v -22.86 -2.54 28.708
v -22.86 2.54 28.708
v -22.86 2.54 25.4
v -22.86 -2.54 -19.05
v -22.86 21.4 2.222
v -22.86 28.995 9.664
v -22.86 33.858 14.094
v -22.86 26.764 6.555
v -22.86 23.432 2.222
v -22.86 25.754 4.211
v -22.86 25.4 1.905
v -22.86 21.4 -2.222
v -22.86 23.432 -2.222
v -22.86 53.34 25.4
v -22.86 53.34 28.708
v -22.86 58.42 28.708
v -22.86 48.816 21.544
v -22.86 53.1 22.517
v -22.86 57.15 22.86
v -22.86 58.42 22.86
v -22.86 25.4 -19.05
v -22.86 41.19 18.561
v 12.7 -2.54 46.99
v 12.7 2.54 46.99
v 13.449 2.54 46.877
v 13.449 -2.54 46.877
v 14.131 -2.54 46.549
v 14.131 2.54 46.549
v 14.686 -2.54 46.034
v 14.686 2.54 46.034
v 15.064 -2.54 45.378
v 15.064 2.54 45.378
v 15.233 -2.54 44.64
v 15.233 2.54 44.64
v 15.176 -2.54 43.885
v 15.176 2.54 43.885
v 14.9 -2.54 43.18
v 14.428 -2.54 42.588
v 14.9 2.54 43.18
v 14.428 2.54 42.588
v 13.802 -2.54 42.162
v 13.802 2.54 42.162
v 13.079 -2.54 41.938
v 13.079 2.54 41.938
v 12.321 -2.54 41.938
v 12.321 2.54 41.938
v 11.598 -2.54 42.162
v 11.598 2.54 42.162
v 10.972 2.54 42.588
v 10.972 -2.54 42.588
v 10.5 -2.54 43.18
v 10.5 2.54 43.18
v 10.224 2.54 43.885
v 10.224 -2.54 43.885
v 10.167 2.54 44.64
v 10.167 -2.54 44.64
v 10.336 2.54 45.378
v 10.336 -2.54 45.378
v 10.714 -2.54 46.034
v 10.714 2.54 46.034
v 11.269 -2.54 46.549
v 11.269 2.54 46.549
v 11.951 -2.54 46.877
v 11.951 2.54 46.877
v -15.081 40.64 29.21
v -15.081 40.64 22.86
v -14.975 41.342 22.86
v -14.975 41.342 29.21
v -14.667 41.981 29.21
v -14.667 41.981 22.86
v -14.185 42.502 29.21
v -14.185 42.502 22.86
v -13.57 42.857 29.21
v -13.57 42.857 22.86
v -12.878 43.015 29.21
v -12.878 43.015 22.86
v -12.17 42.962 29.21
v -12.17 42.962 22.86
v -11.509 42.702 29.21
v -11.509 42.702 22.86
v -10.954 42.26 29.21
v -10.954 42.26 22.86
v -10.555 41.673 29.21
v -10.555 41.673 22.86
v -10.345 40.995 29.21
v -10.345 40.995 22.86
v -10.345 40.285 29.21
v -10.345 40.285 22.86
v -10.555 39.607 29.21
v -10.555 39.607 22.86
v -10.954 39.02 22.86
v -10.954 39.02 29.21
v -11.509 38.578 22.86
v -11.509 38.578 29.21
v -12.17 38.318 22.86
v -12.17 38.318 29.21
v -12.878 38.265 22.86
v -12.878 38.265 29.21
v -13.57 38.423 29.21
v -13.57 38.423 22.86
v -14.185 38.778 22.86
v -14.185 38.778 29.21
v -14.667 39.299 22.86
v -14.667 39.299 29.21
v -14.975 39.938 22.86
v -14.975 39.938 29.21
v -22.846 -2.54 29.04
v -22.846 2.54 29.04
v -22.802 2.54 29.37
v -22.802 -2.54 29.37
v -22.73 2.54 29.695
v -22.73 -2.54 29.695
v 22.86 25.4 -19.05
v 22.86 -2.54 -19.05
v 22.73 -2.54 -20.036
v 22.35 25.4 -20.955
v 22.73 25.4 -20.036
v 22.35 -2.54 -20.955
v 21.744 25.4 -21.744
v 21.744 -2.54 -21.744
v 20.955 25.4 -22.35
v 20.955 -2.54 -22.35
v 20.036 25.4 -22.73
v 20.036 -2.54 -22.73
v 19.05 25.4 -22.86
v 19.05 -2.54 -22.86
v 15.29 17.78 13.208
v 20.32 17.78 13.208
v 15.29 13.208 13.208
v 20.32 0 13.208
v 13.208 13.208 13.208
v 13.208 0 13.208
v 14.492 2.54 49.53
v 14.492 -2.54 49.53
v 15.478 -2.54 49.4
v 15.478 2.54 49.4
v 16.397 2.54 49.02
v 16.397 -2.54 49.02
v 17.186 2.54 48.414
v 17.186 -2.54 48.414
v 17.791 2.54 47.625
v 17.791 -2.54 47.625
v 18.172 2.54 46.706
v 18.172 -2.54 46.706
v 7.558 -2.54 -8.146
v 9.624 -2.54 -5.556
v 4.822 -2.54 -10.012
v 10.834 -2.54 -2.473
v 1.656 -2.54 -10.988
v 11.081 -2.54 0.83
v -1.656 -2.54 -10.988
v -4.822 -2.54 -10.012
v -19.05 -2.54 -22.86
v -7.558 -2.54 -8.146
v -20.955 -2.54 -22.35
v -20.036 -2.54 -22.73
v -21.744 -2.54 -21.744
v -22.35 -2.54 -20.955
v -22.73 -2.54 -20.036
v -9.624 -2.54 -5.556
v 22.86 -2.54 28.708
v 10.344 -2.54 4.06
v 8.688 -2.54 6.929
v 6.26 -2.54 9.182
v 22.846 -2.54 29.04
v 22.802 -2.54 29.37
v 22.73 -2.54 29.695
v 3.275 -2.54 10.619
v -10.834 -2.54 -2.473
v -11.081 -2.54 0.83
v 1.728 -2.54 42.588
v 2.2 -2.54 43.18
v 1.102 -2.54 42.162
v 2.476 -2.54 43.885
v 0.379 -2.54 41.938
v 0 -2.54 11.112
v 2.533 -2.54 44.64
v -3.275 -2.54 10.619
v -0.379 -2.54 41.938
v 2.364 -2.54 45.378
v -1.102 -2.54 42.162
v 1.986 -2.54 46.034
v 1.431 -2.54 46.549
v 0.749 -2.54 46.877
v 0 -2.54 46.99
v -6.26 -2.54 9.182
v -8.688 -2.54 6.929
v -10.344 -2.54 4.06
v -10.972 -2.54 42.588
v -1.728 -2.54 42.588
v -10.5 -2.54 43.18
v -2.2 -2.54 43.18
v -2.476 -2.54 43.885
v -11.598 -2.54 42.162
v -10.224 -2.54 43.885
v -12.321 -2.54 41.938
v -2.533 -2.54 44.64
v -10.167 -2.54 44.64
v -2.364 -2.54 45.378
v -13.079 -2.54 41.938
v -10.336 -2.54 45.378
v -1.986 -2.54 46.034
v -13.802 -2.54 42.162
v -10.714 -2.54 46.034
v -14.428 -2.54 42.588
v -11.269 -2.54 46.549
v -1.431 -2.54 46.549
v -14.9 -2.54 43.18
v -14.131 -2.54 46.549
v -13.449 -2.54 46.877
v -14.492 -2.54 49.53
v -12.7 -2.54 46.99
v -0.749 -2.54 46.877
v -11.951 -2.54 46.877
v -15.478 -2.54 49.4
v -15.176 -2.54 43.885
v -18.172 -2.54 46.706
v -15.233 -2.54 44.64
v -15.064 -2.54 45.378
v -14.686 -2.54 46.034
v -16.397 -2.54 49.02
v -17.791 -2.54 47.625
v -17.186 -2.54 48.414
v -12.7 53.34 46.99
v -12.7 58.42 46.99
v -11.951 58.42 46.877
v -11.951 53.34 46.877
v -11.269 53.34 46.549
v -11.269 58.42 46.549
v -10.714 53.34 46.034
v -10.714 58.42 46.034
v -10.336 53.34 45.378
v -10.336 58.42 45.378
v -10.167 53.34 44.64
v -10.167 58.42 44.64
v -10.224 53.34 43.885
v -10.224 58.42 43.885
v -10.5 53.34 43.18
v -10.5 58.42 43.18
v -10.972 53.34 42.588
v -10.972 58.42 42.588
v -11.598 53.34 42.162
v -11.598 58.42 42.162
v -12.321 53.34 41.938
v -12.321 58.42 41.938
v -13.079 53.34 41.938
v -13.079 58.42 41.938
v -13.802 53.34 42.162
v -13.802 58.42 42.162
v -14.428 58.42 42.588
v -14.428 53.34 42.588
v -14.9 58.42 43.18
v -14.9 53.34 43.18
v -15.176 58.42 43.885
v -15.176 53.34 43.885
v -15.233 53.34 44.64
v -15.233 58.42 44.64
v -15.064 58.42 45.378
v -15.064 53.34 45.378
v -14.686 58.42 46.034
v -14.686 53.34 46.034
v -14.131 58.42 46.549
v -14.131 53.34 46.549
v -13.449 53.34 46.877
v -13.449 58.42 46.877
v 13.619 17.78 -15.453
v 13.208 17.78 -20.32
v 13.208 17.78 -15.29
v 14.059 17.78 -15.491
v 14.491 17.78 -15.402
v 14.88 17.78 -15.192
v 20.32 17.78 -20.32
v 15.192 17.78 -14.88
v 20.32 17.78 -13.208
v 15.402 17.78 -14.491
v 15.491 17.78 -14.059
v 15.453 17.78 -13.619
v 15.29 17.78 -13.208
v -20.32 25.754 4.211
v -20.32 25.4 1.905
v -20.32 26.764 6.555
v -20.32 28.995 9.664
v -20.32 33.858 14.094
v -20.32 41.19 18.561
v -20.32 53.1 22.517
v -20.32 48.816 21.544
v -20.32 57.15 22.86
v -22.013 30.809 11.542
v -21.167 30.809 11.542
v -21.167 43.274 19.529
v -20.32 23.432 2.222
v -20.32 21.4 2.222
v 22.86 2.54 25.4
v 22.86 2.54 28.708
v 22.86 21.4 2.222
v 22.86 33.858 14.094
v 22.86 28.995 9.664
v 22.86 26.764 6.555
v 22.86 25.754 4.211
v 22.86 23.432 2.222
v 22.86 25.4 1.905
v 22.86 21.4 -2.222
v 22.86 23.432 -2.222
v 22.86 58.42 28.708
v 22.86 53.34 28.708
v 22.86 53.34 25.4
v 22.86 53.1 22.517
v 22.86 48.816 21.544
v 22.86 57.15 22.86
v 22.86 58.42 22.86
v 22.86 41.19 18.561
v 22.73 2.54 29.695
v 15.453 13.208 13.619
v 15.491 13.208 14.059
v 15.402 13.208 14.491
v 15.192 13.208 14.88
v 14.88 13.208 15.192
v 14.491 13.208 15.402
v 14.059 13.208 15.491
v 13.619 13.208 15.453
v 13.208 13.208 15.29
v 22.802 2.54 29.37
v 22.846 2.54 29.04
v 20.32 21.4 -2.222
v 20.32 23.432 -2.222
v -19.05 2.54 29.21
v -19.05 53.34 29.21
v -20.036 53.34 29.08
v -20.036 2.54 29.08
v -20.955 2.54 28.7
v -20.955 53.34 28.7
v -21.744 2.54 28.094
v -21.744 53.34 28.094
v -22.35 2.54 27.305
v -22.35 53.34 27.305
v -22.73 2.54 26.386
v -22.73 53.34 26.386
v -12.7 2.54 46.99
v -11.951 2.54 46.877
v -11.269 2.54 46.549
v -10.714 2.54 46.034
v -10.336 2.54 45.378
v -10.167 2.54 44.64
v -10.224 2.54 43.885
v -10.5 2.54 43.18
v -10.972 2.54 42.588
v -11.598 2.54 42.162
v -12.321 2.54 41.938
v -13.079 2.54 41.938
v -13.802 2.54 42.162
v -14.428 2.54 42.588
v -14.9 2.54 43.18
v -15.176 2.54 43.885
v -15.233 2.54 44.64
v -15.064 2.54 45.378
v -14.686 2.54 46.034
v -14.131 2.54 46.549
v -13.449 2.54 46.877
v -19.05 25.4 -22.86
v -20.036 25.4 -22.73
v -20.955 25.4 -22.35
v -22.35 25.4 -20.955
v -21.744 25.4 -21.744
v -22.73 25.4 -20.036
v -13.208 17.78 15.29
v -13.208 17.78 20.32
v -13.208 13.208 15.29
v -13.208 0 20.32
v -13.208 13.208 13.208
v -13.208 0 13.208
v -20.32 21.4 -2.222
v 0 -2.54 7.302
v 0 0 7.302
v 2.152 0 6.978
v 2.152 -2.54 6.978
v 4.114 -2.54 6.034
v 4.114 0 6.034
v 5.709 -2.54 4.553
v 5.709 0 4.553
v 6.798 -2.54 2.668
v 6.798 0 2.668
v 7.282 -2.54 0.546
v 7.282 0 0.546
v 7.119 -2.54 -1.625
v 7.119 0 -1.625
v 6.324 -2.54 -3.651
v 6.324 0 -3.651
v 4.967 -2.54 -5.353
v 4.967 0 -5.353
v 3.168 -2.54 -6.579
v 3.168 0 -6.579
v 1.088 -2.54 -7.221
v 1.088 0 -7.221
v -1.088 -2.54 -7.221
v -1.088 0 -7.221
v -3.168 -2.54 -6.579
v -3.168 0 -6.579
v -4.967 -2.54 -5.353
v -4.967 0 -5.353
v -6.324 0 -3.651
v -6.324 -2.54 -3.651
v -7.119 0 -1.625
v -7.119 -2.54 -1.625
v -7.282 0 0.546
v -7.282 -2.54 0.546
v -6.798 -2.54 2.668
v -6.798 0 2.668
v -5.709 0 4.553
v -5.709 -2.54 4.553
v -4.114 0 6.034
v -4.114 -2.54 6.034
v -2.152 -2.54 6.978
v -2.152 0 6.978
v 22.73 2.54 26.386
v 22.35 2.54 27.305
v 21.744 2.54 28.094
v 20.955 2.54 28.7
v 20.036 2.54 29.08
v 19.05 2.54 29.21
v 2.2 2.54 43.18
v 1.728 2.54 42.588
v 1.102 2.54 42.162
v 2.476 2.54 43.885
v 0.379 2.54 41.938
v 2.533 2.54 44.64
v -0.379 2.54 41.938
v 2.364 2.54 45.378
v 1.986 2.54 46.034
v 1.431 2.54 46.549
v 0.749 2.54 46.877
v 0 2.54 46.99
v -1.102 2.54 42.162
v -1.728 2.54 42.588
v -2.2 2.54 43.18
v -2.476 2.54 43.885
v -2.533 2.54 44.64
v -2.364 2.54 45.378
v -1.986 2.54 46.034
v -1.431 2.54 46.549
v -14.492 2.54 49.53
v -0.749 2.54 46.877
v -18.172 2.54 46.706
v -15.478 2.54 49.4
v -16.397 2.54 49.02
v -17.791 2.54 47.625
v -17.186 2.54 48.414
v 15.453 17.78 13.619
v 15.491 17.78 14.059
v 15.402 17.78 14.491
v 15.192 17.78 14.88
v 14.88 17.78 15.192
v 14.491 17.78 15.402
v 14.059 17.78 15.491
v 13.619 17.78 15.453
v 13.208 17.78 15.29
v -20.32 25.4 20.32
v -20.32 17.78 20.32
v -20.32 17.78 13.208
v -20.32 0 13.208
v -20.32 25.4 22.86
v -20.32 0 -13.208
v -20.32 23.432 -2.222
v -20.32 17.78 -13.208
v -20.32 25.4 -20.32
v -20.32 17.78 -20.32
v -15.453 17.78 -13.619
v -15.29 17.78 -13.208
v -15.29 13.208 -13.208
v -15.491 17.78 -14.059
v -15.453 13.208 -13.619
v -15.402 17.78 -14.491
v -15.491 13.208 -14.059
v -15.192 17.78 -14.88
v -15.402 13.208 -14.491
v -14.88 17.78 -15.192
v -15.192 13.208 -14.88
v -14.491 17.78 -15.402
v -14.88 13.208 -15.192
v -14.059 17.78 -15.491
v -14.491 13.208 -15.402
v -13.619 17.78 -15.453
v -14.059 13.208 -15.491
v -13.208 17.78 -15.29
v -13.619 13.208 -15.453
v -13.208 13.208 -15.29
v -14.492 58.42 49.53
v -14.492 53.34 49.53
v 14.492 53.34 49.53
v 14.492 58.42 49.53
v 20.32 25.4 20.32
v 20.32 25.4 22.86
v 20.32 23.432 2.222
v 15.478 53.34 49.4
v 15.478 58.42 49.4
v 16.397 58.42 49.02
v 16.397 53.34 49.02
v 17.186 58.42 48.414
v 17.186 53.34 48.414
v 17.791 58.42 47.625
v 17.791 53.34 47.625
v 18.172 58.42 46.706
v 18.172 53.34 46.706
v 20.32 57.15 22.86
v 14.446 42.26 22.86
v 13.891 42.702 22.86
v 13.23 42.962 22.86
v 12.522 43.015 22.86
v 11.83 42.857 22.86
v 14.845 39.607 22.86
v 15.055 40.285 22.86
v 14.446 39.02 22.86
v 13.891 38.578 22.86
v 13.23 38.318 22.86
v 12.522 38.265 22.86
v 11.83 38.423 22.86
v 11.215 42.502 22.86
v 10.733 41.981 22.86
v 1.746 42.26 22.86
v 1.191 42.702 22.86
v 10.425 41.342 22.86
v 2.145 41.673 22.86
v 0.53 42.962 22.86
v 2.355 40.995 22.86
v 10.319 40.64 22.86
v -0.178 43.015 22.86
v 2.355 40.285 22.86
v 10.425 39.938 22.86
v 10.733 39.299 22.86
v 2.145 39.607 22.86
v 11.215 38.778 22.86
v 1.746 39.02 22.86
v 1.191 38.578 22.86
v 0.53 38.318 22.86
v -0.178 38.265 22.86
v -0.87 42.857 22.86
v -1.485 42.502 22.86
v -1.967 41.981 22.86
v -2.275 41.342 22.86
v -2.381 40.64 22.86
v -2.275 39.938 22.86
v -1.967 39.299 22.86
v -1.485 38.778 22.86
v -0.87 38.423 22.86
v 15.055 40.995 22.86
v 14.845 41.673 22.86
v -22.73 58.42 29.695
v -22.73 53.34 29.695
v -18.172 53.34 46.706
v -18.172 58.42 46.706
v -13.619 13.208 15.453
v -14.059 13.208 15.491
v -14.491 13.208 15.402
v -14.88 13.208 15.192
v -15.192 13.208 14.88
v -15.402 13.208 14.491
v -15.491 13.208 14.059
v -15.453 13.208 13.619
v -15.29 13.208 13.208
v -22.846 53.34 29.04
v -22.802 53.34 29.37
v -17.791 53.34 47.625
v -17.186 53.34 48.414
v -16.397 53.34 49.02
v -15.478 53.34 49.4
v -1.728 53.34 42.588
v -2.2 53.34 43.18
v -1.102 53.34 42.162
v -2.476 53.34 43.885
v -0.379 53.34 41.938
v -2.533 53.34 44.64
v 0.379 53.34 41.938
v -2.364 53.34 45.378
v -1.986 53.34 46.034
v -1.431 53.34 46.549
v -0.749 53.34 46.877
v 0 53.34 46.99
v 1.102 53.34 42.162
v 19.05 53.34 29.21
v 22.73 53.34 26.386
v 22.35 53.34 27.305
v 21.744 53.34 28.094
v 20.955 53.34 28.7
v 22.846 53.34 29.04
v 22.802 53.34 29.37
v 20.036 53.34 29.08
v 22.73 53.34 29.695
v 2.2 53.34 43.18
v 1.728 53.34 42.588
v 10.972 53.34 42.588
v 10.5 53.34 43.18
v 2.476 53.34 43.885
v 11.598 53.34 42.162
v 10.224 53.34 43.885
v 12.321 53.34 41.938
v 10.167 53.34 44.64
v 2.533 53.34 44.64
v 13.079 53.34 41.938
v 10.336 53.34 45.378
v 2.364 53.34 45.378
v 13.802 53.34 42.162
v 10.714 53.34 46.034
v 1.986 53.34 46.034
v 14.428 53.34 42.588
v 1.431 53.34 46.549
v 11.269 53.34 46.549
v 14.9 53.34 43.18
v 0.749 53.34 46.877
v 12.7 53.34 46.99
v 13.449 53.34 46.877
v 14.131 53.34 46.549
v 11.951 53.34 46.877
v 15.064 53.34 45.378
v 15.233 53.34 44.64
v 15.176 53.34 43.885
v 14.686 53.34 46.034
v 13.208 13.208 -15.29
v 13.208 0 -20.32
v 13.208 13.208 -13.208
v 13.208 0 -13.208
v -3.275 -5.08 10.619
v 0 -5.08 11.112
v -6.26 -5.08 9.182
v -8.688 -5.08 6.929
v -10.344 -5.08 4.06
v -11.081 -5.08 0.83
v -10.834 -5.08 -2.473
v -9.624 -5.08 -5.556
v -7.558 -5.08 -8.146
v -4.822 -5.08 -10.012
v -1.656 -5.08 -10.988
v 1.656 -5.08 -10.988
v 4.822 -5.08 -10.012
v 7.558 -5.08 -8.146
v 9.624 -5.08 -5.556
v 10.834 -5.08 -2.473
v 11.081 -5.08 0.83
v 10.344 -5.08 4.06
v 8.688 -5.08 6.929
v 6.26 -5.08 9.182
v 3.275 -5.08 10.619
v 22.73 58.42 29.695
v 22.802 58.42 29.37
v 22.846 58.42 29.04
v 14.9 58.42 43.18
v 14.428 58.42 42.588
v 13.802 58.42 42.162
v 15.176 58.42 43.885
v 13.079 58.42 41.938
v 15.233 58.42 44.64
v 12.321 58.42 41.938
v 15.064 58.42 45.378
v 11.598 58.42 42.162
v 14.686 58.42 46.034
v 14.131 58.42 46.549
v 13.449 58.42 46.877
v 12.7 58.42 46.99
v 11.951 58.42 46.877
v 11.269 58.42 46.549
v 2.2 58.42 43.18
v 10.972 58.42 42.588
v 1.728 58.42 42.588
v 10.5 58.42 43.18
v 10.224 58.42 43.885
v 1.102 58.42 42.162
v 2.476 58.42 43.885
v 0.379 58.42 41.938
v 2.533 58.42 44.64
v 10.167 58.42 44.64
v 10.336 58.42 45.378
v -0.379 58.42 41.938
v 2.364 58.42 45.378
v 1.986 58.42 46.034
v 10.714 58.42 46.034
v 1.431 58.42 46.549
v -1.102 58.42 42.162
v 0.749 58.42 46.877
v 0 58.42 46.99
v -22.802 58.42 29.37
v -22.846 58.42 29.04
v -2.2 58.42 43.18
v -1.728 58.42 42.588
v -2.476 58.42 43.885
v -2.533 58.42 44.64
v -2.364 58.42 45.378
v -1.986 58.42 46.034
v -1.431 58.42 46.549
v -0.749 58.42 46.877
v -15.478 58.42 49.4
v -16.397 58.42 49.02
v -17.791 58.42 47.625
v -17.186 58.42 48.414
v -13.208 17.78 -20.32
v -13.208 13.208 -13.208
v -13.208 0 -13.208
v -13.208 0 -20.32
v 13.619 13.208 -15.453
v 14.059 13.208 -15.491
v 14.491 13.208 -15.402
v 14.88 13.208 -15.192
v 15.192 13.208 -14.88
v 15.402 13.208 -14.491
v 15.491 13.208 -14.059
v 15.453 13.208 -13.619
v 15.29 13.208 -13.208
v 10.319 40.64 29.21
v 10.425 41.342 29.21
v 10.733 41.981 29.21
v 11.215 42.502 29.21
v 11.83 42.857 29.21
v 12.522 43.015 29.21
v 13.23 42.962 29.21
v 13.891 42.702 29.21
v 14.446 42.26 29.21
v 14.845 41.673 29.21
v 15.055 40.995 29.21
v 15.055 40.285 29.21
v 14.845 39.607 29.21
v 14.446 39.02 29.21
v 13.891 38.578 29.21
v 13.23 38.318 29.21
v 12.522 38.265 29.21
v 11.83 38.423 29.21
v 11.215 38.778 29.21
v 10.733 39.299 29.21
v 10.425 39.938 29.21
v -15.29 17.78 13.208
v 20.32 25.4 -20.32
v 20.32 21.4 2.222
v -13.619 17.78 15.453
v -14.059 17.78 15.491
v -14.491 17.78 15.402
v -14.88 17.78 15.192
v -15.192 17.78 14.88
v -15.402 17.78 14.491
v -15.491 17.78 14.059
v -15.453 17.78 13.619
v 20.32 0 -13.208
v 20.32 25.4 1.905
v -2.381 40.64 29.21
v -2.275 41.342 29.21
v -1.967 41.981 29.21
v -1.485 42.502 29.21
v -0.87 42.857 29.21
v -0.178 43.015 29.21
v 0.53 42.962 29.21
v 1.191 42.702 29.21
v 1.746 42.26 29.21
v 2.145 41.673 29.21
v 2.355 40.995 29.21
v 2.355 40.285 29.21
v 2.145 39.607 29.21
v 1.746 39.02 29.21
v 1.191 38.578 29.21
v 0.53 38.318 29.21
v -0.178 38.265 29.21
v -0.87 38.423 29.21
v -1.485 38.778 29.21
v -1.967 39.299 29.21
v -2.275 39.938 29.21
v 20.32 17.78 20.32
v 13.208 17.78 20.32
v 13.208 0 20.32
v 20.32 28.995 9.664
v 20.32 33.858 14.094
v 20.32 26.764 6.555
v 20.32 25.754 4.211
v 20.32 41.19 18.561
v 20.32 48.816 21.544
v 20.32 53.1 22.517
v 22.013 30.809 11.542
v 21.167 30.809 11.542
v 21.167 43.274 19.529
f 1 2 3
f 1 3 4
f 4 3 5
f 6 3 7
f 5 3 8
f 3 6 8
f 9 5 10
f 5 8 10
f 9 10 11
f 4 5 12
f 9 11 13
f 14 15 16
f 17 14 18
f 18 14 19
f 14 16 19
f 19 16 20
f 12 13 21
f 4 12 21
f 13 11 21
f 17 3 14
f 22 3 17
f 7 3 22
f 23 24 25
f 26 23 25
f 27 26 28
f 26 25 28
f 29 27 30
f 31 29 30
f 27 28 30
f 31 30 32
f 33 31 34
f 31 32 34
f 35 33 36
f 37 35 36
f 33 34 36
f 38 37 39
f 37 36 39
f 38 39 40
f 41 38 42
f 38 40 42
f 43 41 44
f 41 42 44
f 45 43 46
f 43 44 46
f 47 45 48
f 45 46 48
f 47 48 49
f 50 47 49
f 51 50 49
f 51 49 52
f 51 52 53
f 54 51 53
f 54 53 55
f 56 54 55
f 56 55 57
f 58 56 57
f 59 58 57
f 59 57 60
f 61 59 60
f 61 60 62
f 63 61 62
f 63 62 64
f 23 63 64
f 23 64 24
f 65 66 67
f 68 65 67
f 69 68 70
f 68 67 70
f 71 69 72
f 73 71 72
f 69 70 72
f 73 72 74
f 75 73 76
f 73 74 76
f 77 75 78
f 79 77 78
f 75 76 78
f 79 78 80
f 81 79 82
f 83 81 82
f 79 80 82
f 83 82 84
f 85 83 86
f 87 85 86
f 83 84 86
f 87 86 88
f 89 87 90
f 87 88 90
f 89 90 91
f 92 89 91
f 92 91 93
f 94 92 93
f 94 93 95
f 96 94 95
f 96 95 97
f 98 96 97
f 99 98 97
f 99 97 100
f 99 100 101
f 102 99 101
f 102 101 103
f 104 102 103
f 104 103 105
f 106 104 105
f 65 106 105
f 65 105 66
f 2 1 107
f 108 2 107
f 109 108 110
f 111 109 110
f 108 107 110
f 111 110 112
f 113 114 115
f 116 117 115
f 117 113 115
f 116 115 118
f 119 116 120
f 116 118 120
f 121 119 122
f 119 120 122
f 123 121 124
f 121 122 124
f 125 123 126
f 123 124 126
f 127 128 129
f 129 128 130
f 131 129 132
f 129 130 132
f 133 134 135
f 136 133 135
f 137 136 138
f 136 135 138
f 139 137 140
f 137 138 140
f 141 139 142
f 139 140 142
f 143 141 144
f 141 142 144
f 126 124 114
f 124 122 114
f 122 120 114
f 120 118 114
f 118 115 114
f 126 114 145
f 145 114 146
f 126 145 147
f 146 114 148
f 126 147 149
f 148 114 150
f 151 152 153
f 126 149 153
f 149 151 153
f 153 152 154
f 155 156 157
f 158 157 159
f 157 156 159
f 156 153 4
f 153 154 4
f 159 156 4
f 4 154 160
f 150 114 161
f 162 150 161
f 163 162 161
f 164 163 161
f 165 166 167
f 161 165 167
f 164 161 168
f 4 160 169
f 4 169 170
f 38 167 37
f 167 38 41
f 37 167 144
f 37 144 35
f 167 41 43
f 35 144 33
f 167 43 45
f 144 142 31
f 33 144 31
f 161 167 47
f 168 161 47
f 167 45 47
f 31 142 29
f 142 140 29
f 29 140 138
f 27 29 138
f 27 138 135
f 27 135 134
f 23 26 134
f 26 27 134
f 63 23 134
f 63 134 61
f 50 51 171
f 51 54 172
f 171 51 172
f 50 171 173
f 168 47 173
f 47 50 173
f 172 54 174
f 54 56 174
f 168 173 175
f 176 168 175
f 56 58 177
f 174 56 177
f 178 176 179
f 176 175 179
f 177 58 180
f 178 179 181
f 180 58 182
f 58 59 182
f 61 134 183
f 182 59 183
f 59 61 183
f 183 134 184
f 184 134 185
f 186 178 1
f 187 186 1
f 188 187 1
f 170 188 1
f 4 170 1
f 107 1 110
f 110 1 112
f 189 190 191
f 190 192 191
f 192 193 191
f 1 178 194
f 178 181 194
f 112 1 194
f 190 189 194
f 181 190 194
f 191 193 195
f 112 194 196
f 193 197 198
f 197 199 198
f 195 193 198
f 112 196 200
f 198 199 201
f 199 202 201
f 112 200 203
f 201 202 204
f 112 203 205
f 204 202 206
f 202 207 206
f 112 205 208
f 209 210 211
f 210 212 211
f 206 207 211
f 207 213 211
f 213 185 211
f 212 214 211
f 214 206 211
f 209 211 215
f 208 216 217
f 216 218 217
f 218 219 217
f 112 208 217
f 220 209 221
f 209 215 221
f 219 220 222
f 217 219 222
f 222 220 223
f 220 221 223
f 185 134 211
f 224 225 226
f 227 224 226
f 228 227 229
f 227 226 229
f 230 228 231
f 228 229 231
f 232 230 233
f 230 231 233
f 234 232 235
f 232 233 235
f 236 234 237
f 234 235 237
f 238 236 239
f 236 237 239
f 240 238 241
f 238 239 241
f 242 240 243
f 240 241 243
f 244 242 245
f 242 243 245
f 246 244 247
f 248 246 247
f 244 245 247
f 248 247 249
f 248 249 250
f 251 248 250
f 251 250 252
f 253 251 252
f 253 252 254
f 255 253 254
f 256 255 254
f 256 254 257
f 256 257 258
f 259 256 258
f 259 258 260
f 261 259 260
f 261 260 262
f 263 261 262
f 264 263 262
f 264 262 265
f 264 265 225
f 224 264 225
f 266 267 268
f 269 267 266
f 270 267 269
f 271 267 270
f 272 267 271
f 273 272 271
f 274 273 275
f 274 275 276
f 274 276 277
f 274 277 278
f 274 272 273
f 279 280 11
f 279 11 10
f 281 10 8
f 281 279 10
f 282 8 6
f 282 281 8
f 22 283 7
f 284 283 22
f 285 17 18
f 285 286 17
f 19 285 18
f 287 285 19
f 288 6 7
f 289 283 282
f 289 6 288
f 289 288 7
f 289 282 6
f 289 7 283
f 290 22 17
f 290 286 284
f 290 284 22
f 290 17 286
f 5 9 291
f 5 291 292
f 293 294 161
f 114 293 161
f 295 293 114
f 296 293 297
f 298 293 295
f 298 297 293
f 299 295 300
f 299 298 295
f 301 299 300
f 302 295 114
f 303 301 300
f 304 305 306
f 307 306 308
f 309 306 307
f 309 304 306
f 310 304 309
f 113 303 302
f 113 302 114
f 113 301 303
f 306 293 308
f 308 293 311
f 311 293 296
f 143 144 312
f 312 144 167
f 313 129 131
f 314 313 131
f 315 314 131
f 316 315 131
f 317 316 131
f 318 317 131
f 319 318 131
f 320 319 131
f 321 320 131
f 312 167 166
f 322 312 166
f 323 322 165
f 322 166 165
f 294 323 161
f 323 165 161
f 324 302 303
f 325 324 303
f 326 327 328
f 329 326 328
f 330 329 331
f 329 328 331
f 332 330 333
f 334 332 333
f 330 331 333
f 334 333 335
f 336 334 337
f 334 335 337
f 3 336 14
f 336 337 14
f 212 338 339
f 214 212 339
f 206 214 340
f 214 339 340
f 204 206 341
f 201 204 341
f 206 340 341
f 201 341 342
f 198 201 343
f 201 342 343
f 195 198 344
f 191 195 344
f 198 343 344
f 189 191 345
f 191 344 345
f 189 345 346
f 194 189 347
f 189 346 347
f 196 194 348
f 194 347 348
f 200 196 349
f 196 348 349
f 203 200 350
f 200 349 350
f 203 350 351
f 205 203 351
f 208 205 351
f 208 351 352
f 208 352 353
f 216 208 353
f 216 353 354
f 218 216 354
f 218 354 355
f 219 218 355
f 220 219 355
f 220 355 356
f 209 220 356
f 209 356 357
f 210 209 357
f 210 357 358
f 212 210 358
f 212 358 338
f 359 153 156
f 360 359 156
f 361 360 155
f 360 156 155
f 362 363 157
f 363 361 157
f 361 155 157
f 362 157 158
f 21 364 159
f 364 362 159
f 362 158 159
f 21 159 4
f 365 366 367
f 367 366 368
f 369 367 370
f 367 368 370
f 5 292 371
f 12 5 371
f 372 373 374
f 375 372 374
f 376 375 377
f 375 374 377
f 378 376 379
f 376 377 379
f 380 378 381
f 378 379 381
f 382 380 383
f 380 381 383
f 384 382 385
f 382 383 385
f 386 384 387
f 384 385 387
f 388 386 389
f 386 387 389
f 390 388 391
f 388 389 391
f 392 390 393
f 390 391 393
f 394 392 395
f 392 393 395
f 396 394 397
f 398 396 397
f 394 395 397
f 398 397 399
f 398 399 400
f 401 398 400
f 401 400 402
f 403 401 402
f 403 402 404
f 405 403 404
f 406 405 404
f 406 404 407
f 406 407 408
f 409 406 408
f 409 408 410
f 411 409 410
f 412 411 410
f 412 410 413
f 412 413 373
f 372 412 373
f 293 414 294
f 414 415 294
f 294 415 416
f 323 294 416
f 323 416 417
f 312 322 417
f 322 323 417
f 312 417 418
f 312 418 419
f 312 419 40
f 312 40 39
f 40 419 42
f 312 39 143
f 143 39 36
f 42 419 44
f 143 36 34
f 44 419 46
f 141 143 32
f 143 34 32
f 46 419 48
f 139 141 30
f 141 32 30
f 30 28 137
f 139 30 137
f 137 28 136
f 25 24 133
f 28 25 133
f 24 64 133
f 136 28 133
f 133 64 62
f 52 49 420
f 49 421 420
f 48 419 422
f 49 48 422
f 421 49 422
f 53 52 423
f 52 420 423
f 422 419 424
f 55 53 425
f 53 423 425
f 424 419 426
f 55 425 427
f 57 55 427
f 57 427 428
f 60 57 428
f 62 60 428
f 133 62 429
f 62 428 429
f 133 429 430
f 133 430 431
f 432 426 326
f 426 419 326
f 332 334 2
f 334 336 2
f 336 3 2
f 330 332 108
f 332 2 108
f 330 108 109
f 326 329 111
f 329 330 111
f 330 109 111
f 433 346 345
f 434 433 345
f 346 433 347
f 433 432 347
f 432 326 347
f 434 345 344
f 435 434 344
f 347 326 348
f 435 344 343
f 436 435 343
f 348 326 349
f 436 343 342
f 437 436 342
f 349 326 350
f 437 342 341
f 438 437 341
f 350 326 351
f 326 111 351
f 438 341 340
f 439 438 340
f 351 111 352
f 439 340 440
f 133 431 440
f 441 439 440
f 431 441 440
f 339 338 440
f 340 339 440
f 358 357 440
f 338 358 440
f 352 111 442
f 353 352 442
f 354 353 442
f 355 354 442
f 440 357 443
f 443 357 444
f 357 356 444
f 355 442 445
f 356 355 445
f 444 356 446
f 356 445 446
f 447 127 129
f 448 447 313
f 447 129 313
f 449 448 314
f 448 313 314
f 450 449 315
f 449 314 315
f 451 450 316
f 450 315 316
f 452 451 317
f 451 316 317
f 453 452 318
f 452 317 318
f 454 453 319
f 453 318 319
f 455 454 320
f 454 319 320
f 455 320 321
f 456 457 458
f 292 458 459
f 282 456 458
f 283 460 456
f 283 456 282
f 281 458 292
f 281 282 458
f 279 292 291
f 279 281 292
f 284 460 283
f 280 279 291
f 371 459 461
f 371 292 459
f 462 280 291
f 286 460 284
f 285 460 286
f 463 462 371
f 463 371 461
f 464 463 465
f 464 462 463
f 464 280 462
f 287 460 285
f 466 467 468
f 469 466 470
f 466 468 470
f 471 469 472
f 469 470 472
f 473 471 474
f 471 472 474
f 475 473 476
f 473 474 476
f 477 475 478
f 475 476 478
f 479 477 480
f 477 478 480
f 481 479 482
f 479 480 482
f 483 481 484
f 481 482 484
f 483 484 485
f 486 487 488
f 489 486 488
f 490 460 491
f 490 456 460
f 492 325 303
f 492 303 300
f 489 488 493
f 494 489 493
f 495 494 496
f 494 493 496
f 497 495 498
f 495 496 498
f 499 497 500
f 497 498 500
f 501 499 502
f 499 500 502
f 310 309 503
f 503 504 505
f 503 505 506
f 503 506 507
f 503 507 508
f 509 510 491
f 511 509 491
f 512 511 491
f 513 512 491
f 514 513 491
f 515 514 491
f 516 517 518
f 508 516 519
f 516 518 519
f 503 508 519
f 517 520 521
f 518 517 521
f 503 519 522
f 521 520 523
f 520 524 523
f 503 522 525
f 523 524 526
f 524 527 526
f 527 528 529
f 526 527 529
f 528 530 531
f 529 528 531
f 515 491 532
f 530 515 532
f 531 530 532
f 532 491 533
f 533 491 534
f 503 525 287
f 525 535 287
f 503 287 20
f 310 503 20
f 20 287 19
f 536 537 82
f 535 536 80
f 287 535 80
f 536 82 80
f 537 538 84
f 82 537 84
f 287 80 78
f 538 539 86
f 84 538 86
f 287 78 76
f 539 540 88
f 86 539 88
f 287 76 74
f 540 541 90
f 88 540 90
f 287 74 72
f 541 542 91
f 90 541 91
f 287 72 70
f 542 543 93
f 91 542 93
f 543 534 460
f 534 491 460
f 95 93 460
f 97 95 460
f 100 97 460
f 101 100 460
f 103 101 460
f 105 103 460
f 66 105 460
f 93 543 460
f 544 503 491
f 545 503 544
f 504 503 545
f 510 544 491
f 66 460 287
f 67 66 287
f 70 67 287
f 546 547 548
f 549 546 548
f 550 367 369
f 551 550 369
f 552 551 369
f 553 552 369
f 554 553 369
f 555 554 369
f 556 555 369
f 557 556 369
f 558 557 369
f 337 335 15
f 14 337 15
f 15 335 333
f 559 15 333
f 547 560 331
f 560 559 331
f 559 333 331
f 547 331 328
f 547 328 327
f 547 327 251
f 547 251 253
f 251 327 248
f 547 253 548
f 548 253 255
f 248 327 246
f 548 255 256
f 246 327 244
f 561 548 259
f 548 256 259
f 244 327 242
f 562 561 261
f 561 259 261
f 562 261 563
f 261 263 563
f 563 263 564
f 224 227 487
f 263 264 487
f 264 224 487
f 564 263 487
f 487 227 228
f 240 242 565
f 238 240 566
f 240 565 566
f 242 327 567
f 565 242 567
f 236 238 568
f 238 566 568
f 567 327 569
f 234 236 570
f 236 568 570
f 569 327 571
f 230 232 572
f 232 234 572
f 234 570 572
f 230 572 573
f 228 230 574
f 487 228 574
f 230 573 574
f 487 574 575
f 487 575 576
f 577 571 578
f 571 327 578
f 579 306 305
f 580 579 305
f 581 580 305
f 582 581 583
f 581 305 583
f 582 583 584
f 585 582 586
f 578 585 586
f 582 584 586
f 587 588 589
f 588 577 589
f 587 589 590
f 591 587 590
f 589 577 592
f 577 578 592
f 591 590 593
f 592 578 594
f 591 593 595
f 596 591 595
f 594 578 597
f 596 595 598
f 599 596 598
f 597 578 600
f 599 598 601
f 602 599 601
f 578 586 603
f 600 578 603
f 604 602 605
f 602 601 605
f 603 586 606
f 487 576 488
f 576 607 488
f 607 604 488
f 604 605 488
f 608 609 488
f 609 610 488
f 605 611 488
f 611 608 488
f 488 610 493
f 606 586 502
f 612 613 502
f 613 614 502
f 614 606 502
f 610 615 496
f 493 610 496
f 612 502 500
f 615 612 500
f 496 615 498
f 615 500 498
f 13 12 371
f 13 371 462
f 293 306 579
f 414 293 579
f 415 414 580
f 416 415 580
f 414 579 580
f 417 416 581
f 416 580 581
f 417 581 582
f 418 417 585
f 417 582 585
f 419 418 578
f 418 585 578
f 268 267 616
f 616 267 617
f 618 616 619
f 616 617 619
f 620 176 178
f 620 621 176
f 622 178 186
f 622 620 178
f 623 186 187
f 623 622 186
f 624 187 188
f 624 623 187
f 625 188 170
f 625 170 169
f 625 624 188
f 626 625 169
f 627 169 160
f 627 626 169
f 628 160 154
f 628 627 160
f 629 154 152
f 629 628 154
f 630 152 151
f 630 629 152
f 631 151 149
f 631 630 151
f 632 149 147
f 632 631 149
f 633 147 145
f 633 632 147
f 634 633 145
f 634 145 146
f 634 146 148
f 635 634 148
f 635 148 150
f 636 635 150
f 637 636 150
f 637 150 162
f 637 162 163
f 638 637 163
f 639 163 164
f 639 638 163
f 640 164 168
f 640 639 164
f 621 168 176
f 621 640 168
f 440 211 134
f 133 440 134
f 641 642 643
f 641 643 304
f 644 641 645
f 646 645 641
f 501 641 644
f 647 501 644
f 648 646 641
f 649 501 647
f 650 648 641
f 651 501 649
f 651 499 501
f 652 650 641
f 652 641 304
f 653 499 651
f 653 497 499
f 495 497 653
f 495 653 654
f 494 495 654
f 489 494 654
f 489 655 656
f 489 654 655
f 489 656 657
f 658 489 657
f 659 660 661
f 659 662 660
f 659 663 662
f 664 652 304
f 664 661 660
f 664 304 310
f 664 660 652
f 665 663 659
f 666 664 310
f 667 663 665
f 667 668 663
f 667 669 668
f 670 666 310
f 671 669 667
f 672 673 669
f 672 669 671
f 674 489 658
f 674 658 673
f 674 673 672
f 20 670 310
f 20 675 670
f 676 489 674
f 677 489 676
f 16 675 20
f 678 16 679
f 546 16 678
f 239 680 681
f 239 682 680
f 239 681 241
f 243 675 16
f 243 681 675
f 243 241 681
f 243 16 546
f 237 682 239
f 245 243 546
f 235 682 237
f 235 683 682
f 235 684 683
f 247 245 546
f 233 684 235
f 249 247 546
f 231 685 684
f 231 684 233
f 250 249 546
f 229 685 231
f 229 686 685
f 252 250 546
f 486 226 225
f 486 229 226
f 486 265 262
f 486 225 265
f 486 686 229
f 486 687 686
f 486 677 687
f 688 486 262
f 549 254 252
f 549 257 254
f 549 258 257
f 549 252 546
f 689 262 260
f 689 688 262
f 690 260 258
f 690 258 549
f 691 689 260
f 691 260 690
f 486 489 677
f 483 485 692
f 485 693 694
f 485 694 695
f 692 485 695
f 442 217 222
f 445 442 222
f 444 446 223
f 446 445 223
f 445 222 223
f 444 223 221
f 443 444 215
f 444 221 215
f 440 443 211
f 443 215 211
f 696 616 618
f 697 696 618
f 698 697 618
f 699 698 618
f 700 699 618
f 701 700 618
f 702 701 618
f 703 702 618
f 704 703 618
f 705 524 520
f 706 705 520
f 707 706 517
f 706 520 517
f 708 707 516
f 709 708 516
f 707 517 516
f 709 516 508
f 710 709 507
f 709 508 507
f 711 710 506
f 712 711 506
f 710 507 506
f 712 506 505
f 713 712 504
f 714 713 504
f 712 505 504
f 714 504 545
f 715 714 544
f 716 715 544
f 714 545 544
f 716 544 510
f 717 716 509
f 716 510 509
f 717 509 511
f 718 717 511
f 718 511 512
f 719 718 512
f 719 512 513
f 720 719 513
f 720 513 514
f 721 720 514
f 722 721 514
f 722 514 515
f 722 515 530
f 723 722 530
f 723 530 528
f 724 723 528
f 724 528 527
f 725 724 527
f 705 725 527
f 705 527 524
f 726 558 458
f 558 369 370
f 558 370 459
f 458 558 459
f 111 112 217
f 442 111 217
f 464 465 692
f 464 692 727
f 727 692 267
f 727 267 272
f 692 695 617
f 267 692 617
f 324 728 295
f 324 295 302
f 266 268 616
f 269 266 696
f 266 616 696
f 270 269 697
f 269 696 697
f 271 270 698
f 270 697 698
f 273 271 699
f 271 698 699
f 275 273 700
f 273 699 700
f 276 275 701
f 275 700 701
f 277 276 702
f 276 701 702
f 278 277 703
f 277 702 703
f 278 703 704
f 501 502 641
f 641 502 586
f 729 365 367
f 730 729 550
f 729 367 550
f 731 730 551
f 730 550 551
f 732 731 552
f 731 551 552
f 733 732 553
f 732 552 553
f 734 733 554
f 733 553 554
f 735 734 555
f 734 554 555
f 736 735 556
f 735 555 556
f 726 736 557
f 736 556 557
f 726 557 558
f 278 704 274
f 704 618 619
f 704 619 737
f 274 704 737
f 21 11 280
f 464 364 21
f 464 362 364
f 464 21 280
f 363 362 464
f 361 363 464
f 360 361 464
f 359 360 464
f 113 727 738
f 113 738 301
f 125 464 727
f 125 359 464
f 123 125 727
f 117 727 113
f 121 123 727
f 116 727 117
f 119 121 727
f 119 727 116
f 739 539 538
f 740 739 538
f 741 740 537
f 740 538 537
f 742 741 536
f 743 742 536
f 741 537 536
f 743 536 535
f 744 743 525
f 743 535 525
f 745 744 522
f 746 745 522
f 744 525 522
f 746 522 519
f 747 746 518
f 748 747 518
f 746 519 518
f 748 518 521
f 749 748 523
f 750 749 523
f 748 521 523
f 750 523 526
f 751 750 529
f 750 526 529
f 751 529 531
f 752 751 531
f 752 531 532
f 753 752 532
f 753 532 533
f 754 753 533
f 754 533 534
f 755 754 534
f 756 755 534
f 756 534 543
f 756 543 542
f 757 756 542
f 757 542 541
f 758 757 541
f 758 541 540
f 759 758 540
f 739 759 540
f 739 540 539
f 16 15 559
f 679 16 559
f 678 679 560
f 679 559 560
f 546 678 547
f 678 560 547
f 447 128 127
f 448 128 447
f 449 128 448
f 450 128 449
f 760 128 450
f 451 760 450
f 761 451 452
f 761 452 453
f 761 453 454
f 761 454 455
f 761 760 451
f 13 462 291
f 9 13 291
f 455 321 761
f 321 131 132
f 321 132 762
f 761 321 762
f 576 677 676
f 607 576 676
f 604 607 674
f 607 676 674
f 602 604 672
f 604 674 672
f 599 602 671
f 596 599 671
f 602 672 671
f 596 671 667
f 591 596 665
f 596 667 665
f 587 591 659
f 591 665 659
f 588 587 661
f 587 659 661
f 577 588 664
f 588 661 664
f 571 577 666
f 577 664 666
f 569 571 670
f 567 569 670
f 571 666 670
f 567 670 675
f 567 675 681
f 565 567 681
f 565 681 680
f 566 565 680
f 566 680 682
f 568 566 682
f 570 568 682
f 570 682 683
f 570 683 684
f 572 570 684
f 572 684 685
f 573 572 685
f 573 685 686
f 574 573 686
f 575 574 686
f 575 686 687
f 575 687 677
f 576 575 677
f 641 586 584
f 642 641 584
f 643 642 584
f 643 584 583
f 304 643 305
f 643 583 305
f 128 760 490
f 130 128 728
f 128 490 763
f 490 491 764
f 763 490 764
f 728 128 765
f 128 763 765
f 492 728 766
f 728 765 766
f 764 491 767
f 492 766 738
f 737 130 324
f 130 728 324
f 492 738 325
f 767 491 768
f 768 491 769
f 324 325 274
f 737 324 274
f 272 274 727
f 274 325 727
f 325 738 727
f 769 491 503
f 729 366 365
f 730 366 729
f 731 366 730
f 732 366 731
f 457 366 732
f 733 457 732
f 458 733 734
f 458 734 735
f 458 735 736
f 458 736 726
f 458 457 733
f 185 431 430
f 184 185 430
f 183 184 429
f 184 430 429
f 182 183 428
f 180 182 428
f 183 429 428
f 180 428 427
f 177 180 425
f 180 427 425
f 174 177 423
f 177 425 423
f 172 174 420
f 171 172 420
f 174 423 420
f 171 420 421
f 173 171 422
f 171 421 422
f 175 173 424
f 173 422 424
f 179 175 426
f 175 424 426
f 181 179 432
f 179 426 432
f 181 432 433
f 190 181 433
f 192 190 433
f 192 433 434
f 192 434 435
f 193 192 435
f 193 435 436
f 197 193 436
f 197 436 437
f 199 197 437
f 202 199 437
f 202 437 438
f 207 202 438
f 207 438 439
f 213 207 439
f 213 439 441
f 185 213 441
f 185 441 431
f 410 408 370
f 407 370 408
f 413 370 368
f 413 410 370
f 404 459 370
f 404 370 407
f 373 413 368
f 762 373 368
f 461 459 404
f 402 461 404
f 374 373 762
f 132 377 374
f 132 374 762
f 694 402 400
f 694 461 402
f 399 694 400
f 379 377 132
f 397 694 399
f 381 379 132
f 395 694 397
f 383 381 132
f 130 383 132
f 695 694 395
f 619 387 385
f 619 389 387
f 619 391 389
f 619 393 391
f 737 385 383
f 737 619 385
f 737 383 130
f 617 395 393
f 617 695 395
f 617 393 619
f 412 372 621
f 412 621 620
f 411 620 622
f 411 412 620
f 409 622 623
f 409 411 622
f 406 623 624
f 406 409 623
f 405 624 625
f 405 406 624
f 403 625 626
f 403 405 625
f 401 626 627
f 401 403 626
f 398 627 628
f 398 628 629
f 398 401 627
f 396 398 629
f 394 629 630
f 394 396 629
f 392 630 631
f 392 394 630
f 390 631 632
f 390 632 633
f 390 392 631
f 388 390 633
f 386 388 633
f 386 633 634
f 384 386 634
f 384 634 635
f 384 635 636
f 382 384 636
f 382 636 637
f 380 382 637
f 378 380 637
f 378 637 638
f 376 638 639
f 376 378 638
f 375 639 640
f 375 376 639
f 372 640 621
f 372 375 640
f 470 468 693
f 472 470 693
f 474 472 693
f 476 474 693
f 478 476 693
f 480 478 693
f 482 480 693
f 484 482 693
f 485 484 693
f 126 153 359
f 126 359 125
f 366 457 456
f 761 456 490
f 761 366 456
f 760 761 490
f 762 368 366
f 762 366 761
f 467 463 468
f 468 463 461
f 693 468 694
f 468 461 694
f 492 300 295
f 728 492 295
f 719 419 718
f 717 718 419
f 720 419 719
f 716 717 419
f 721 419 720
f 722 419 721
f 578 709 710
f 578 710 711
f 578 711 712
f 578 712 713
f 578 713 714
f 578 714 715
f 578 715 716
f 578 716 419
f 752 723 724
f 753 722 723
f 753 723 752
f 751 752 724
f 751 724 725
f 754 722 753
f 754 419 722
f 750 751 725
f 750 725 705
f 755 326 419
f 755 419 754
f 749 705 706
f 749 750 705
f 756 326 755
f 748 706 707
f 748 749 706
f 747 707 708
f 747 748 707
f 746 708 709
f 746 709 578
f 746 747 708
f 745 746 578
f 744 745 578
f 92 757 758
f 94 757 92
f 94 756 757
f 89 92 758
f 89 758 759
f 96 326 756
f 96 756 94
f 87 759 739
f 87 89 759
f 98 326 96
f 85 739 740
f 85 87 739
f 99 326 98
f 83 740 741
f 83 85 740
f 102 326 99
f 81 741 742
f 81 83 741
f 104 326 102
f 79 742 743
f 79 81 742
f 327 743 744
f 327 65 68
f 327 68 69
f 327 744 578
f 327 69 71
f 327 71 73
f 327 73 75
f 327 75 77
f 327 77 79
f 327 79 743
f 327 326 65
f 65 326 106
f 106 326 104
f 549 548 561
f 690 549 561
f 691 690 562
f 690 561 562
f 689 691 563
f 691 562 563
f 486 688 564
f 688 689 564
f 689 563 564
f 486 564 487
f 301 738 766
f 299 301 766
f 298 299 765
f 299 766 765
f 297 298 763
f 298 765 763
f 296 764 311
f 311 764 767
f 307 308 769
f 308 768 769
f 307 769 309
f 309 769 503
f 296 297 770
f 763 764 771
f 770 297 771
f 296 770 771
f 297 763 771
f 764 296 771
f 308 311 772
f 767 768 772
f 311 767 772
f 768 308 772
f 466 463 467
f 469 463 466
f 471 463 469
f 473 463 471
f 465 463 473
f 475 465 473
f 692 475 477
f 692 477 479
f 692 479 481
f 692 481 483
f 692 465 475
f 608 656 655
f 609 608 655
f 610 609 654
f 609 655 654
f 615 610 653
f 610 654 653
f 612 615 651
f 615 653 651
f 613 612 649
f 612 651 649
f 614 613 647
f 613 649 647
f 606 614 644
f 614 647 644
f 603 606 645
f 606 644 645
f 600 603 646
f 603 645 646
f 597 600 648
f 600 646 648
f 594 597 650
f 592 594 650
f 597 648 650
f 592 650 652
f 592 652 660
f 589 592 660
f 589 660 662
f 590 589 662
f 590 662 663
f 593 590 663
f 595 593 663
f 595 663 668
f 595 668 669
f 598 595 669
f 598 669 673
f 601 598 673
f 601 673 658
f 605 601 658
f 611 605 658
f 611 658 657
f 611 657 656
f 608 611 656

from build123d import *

# Parameters (mm, degrees)
SKETCH1_W           = 40.64
SKETCH1_H           = 40.64
BOSS_EXTRUDE1_DEPTH = 25.4
SHELL1_T            = 2.54
SKETCH2_W           = 7.112
SKETCH2_H           = 7.112
BOSS_EXTRUDE2_DEPTH = 17.78
BOSS_EXTRUDE3_DEPTH = 60.96
SKETCH5_W           = 20.32
SKETCH5_H           = 50.8
CUT_EXTRUDE1_DEPTH  = 90.198854813
SKETCH6_R           = 2.54
CUT_EXTRUDE2_DEPTH  = 82.804169209
FILLET1_R           = 3.81
SKETCH10_R          = 1.524
CUT_EXTRUDE4_DEPTH  = 4.572
CIRPATTERN1_COUNT   = 4
SKETCH11_R          = 7.3025
CUT_EXTRUDE5_DEPTH  = 80.929324406
RIB1_START          = -2.54
RIB1_DEPTH          = 2.54
SKETCH19_R          = 2.38125
CUT_EXTRUDE6_DEPTH  = 78.625990598
SKETCH20_W          = 2.032
SKETCH20_H          = 4.445


with BuildPart() as part:
    # Sketch1 → Boss-Extrude1 (new body)
    with BuildSketch(Plane(origin=(0, 0, 0), x_dir=(1, 0, 0), z_dir=(0, 1, 0))):
        Rectangle(SKETCH1_W, SKETCH1_H)
    extrude(amount=BOSS_EXTRUDE1_DEPTH)

    # Shell1
    shell1_openings = [part.faces().sort_by_distance(p)[0] for p in [
        (0, 25.4, 0),
    ]]
    offset(amount=SHELL1_T, openings=shell1_openings, kind=Kind.INTERSECTION)

    # Sketch2 → Boss-Extrude2 (add)
    with BuildSketch(Plane(origin=(0, 0, 0), x_dir=(1, 0, 0), z_dir=(0, 1, 0))):
        with Locations((-16.764, 16.764)):
            Rectangle(SKETCH2_W, SKETCH2_H)
    boss_extrude2 = extrude(amount=BOSS_EXTRUDE2_DEPTH)

    # Sketch3 → Boss-Extrude3 (add)
    with BuildSketch(Plane.XZ.offset(2.54)):
        with BuildLine():
            Line((-22.730177398, 29.694504546), (-17.41527241, 49.53))
            Line((-17.41527241, 49.53), (17.41527241, 49.53))
            Line((17.41527241, 49.53), (22.730177398, 29.694504546))
            ThreePointArc((22.730177398, 29.694504546), (22.827404922, 29.205708777), (22.86, 28.708403984))
            Line((22.86, 28.708403984), (22.86, 22.86))
            Line((22.86, 22.86), (-22.86, 22.86))
            Line((-22.86, 22.86), (-22.86, 28.708403984))
            ThreePointArc((-22.86, 28.708403984), (-22.827404922, 29.205708777), (-22.730177398, 29.694504546))
        make_face()
    extrude(amount=-BOSS_EXTRUDE3_DEPTH)

    # Sketch5 → Cut-Extrude1 (cut, through all)
    with BuildSketch(Plane.ZY.offset(22.86)):
        with Locations((39.37, 27.94)):
            Rectangle(SKETCH5_W, SKETCH5_H)
    extrude(amount=-CUT_EXTRUDE1_DEPTH, mode=Mode.SUBTRACT)

    # Sketch6 → Cut-Extrude2 (cut, through all)
    with BuildSketch(Plane(origin=(0, 58.42, 0), x_dir=(1, 0, 0), z_dir=(0, 1, 0))):
        with Locations(Location((-12.7, -44.45, 0), (0, 0, 270))):
            Circle(SKETCH6_R)
        with Locations(Location((0, -44.45, 0), (0, 0, 270))):
            Circle(SKETCH6_R)
        with Locations(Location((12.7, -44.45, 0), (0, 0, 270))):
            Circle(SKETCH6_R)
    extrude(amount=-CUT_EXTRUDE2_DEPTH, mode=Mode.SUBTRACT)

    # Fillet1
    # the kernel refuses this fillet: 3.81 mm, written as the material it takes off along each edge
    with BuildSketch(Plane(origin=(-17.41527241, 46.03121044, 49.53), x_dir=(-0.25881904510252424, 0, -0.9659258262890673), z_dir=(0, 1, 0)), Plane(origin=(17.41527241, 46.03121044, 49.53), x_dir=(-1, 0, 0), z_dir=(0, 1, 0)), Plane(origin=(-17.41527241, -9.84878956, 49.53), x_dir=(-0.25881904510252424, 0, -0.9659258262890673), z_dir=(0, 1, 0)), Plane(origin=(17.41527241, -9.84878956, 49.53), x_dir=(-1, 0, 0), z_dir=(0, 1, 0))) as fillet1_piece_1:
        with BuildLine():
            CenterArc((FILLET1_R * 0.767326987979, -FILLET1_R), FILLET1_R, 90, 75)
            Line((-FILLET1_R * 0.19859883831, -FILLET1_R * 0.741180954897), (0, 0))
            Line((0, 0), (FILLET1_R * 0.767326987979, 0))
        make_face()
    extrude(amount=19.697579121, mode=Mode.SUBTRACT)
    with BuildSketch(Plane(origin=(-22.826837491, 53.34, 29.21), x_dir=(-0.008703740786851863, 0, -0.999962121730776), z_dir=(0, -1, 0))) as fillet1_piece_2:
        with BuildLine():
            CenterArc((3.776983069, 3.809855684), FILLET1_R, 180.49869391, 90)
            Line((-0.032872615, 3.776694431), (-0.413858183, 3.773378306))
            Line((-0.413858183, 3.773378306), (-0.380985568, -0.003316125))
            Line((-0.380985568, -0.003316125), (-0.04687044, -0.378106019))
            ThreePointArc((-0.04687044, -0.378106019), (0.505181779, -0.409781059), (3.813460447, -0.380985568))
            Line((3.813460447, -0.380985568), (3.810144322, 0))
        make_face()
    extrude(amount=50.8, mode=Mode.SUBTRACT)
    with BuildSketch(Plane(origin=(22.826837491, 53.34, 29.21), x_dir=(0.008703740786853719, 0, -0.999962121730776), z_dir=(0, -1, 0))) as fillet1_piece_3:
        with BuildLine():
            CenterArc((3.776983069, -3.809855684), FILLET1_R, 89.50130609, 90)
            Line((-0.032872615, -3.776694431), (-0.413858183, -3.773378306))
            Line((-0.413858183, -3.773378306), (-0.380985568, 0.003316125))
            Line((-0.380985568, 0.003316125), (-0.04687044, 0.378106019))
            ThreePointArc((-0.04687044, 0.378106019), (0.505181779, 0.409781059), (3.813460447, 0.380985568))
            Line((3.813460447, 0.380985568), (3.810144322, 0))
        make_face()
    extrude(amount=50.8, mode=Mode.SUBTRACT)
    with BuildSketch(Plane(origin=(-22.86, -12.065, -22.86), x_dir=(1, 0, 0), z_dir=(0, 1, 0))) as fillet1_piece_4:
        with BuildLine():
            CenterArc((FILLET1_R, -FILLET1_R), FILLET1_R, 90, 90)
            Line((0, -FILLET1_R), (0, 0))
            Line((0, 0), (FILLET1_R, 0))
        make_face()
    extrude(amount=46.99, mode=Mode.SUBTRACT)
    with BuildSketch(Plane(origin=(22.86, -12.065, -22.86), x_dir=(-1, 0, 0), z_dir=(0, 1, 0))) as fillet1_piece_5:
        with BuildLine():
            CenterArc((FILLET1_R, FILLET1_R), FILLET1_R, 180, 90)
            Line((0, FILLET1_R), (0, 0))
            Line((0, 0), (FILLET1_R, 0))
        make_face()
    extrude(amount=46.99, mode=Mode.SUBTRACT)

    # Sketch10 → Cut-Extrude4 (cut)
    with BuildSketch(Plane.XZ.offset(-13.208)):
        with Locations((-13.97, -13.97)):
            Circle(SKETCH10_R)
    cut_extrude4 = extrude(amount=-CUT_EXTRUDE4_DEPTH, mode=Mode.SUBTRACT)

    # CirPattern1: Boss-Extrude2, Cut-Extrude4 ×4 about axis
    cirpattern1_axis = Axis((0, 0, 0), (0, 1, 0))
    add([boss_extrude2.rotate(cirpattern1_axis, i * 360 / CIRPATTERN1_COUNT) for i in range(1, CIRPATTERN1_COUNT)])
    add([cut_extrude4.rotate(cirpattern1_axis, i * 360 / CIRPATTERN1_COUNT) for i in range(1, CIRPATTERN1_COUNT)], mode=Mode.SUBTRACT)

    # Sketch11 → Cut-Extrude5 (cut, through all)
    with BuildSketch(Plane(origin=(0, 0, 0), x_dir=(1, 0, 0), z_dir=(0, 1, 0))):
        with Locations(Location((0, 0, 0), (0, 0, 270))):
            Circle(SKETCH11_R)
    extrude(amount=-CUT_EXTRUDE5_DEPTH, mode=Mode.SUBTRACT)

    # Sketch12 → Revolve1 (revolve)
    with BuildSketch(Plane.XY, mode=Mode.PRIVATE) as revolve1_sk:
        Polygon((-11.1125, -2.54), (-11.1125, -5.08), (-7.3025, -2.54), align=None)
    revolve(revolve1_sk.sketch.rotate(Axis((0, 12.66825, 0), (0, -1, 0)), 270), axis=Axis((0, 12.66825, 0), (0, -1, 0)))

    # Rib1: read off the stored shape, not the designer's step
    # Rib1 outline → Rib1 (add)
    with BuildSketch(Plane.ZY.offset(22.86).offset(RIB1_START)):
        with BuildLine():
            add(Edge.make_bspline(
                [(1.905, 25.4), (11.363397975, 25.4), (22.86, 44.45), (22.86, 57.15)],
                knots=[0, 0, 0, 0, 1, 1, 1, 1], degree=3))
            Line((1.905, 25.4), (22.86, 25.4))
            Line((22.86, 25.4), (22.86, 57.15))
        make_face()
    rib1 = extrude(amount=RIB1_DEPTH)

    # Mirror2: Rib1 across plane
    add(rib1.mirror(Plane(origin=(0, 0, 0), x_dir=(0, 0, 1), z_dir=(1, 0, 0))))

    # Sketch19 → Cut-Extrude6 (cut, through all)
    with BuildSketch(Plane(origin=(0, 0, 22.86), x_dir=(-1, 0, 0), z_dir=(0, 0, -1))):
        with Locations((-12.7, 40.64)):
            Circle(SKETCH19_R)
        with Locations((12.7, 40.64)):
            Circle(SKETCH19_R)
        with Locations((0, 40.64)):
            Circle(SKETCH19_R)
    extrude(amount=-CUT_EXTRUDE6_DEPTH, mode=Mode.SUBTRACT)

    # Cut-Sweep1: sweep along a path in Sketch21
    with BuildLine() as cut_sweep1_path:  # in the path sketch's own coordinates; laid on its plane below (add() does not lay a ready-made edge on the line's plane)
        Line((-22.86, 22.4155), (-19.05, 22.4155))
        add(Edge.make_bspline(
            [(-19.05, 22.4155), (-16.933333333, 22.4155), (-15.24, 23.791333333), (-15.24, 25.273)],
            knots=[0, 0, 0, 0, 1, 1, 1, 1], degree=3))
    # Sketch20 → Cut-Sweep1 (sweep, cut)
    with BuildSketch(Plane(origin=(0, 25.273, 0), x_dir=(1, 0, 0), z_dir=(0, 1, 0))):
        with Locations((-15.24, 0)):
            Rectangle(SKETCH20_W, SKETCH20_H)
    cut_sweep1 = sweep(path=Plane.XY * cut_sweep1_path.line, mode=Mode.SUBTRACT)

    # Mirror4: Cut-Sweep1 across plane
    add(cut_sweep1.mirror(Plane(origin=(0, 0, 0), x_dir=(0, 0, 1), z_dir=(1, 0, 0))), mode=Mode.SUBTRACT)


solid = part.part
